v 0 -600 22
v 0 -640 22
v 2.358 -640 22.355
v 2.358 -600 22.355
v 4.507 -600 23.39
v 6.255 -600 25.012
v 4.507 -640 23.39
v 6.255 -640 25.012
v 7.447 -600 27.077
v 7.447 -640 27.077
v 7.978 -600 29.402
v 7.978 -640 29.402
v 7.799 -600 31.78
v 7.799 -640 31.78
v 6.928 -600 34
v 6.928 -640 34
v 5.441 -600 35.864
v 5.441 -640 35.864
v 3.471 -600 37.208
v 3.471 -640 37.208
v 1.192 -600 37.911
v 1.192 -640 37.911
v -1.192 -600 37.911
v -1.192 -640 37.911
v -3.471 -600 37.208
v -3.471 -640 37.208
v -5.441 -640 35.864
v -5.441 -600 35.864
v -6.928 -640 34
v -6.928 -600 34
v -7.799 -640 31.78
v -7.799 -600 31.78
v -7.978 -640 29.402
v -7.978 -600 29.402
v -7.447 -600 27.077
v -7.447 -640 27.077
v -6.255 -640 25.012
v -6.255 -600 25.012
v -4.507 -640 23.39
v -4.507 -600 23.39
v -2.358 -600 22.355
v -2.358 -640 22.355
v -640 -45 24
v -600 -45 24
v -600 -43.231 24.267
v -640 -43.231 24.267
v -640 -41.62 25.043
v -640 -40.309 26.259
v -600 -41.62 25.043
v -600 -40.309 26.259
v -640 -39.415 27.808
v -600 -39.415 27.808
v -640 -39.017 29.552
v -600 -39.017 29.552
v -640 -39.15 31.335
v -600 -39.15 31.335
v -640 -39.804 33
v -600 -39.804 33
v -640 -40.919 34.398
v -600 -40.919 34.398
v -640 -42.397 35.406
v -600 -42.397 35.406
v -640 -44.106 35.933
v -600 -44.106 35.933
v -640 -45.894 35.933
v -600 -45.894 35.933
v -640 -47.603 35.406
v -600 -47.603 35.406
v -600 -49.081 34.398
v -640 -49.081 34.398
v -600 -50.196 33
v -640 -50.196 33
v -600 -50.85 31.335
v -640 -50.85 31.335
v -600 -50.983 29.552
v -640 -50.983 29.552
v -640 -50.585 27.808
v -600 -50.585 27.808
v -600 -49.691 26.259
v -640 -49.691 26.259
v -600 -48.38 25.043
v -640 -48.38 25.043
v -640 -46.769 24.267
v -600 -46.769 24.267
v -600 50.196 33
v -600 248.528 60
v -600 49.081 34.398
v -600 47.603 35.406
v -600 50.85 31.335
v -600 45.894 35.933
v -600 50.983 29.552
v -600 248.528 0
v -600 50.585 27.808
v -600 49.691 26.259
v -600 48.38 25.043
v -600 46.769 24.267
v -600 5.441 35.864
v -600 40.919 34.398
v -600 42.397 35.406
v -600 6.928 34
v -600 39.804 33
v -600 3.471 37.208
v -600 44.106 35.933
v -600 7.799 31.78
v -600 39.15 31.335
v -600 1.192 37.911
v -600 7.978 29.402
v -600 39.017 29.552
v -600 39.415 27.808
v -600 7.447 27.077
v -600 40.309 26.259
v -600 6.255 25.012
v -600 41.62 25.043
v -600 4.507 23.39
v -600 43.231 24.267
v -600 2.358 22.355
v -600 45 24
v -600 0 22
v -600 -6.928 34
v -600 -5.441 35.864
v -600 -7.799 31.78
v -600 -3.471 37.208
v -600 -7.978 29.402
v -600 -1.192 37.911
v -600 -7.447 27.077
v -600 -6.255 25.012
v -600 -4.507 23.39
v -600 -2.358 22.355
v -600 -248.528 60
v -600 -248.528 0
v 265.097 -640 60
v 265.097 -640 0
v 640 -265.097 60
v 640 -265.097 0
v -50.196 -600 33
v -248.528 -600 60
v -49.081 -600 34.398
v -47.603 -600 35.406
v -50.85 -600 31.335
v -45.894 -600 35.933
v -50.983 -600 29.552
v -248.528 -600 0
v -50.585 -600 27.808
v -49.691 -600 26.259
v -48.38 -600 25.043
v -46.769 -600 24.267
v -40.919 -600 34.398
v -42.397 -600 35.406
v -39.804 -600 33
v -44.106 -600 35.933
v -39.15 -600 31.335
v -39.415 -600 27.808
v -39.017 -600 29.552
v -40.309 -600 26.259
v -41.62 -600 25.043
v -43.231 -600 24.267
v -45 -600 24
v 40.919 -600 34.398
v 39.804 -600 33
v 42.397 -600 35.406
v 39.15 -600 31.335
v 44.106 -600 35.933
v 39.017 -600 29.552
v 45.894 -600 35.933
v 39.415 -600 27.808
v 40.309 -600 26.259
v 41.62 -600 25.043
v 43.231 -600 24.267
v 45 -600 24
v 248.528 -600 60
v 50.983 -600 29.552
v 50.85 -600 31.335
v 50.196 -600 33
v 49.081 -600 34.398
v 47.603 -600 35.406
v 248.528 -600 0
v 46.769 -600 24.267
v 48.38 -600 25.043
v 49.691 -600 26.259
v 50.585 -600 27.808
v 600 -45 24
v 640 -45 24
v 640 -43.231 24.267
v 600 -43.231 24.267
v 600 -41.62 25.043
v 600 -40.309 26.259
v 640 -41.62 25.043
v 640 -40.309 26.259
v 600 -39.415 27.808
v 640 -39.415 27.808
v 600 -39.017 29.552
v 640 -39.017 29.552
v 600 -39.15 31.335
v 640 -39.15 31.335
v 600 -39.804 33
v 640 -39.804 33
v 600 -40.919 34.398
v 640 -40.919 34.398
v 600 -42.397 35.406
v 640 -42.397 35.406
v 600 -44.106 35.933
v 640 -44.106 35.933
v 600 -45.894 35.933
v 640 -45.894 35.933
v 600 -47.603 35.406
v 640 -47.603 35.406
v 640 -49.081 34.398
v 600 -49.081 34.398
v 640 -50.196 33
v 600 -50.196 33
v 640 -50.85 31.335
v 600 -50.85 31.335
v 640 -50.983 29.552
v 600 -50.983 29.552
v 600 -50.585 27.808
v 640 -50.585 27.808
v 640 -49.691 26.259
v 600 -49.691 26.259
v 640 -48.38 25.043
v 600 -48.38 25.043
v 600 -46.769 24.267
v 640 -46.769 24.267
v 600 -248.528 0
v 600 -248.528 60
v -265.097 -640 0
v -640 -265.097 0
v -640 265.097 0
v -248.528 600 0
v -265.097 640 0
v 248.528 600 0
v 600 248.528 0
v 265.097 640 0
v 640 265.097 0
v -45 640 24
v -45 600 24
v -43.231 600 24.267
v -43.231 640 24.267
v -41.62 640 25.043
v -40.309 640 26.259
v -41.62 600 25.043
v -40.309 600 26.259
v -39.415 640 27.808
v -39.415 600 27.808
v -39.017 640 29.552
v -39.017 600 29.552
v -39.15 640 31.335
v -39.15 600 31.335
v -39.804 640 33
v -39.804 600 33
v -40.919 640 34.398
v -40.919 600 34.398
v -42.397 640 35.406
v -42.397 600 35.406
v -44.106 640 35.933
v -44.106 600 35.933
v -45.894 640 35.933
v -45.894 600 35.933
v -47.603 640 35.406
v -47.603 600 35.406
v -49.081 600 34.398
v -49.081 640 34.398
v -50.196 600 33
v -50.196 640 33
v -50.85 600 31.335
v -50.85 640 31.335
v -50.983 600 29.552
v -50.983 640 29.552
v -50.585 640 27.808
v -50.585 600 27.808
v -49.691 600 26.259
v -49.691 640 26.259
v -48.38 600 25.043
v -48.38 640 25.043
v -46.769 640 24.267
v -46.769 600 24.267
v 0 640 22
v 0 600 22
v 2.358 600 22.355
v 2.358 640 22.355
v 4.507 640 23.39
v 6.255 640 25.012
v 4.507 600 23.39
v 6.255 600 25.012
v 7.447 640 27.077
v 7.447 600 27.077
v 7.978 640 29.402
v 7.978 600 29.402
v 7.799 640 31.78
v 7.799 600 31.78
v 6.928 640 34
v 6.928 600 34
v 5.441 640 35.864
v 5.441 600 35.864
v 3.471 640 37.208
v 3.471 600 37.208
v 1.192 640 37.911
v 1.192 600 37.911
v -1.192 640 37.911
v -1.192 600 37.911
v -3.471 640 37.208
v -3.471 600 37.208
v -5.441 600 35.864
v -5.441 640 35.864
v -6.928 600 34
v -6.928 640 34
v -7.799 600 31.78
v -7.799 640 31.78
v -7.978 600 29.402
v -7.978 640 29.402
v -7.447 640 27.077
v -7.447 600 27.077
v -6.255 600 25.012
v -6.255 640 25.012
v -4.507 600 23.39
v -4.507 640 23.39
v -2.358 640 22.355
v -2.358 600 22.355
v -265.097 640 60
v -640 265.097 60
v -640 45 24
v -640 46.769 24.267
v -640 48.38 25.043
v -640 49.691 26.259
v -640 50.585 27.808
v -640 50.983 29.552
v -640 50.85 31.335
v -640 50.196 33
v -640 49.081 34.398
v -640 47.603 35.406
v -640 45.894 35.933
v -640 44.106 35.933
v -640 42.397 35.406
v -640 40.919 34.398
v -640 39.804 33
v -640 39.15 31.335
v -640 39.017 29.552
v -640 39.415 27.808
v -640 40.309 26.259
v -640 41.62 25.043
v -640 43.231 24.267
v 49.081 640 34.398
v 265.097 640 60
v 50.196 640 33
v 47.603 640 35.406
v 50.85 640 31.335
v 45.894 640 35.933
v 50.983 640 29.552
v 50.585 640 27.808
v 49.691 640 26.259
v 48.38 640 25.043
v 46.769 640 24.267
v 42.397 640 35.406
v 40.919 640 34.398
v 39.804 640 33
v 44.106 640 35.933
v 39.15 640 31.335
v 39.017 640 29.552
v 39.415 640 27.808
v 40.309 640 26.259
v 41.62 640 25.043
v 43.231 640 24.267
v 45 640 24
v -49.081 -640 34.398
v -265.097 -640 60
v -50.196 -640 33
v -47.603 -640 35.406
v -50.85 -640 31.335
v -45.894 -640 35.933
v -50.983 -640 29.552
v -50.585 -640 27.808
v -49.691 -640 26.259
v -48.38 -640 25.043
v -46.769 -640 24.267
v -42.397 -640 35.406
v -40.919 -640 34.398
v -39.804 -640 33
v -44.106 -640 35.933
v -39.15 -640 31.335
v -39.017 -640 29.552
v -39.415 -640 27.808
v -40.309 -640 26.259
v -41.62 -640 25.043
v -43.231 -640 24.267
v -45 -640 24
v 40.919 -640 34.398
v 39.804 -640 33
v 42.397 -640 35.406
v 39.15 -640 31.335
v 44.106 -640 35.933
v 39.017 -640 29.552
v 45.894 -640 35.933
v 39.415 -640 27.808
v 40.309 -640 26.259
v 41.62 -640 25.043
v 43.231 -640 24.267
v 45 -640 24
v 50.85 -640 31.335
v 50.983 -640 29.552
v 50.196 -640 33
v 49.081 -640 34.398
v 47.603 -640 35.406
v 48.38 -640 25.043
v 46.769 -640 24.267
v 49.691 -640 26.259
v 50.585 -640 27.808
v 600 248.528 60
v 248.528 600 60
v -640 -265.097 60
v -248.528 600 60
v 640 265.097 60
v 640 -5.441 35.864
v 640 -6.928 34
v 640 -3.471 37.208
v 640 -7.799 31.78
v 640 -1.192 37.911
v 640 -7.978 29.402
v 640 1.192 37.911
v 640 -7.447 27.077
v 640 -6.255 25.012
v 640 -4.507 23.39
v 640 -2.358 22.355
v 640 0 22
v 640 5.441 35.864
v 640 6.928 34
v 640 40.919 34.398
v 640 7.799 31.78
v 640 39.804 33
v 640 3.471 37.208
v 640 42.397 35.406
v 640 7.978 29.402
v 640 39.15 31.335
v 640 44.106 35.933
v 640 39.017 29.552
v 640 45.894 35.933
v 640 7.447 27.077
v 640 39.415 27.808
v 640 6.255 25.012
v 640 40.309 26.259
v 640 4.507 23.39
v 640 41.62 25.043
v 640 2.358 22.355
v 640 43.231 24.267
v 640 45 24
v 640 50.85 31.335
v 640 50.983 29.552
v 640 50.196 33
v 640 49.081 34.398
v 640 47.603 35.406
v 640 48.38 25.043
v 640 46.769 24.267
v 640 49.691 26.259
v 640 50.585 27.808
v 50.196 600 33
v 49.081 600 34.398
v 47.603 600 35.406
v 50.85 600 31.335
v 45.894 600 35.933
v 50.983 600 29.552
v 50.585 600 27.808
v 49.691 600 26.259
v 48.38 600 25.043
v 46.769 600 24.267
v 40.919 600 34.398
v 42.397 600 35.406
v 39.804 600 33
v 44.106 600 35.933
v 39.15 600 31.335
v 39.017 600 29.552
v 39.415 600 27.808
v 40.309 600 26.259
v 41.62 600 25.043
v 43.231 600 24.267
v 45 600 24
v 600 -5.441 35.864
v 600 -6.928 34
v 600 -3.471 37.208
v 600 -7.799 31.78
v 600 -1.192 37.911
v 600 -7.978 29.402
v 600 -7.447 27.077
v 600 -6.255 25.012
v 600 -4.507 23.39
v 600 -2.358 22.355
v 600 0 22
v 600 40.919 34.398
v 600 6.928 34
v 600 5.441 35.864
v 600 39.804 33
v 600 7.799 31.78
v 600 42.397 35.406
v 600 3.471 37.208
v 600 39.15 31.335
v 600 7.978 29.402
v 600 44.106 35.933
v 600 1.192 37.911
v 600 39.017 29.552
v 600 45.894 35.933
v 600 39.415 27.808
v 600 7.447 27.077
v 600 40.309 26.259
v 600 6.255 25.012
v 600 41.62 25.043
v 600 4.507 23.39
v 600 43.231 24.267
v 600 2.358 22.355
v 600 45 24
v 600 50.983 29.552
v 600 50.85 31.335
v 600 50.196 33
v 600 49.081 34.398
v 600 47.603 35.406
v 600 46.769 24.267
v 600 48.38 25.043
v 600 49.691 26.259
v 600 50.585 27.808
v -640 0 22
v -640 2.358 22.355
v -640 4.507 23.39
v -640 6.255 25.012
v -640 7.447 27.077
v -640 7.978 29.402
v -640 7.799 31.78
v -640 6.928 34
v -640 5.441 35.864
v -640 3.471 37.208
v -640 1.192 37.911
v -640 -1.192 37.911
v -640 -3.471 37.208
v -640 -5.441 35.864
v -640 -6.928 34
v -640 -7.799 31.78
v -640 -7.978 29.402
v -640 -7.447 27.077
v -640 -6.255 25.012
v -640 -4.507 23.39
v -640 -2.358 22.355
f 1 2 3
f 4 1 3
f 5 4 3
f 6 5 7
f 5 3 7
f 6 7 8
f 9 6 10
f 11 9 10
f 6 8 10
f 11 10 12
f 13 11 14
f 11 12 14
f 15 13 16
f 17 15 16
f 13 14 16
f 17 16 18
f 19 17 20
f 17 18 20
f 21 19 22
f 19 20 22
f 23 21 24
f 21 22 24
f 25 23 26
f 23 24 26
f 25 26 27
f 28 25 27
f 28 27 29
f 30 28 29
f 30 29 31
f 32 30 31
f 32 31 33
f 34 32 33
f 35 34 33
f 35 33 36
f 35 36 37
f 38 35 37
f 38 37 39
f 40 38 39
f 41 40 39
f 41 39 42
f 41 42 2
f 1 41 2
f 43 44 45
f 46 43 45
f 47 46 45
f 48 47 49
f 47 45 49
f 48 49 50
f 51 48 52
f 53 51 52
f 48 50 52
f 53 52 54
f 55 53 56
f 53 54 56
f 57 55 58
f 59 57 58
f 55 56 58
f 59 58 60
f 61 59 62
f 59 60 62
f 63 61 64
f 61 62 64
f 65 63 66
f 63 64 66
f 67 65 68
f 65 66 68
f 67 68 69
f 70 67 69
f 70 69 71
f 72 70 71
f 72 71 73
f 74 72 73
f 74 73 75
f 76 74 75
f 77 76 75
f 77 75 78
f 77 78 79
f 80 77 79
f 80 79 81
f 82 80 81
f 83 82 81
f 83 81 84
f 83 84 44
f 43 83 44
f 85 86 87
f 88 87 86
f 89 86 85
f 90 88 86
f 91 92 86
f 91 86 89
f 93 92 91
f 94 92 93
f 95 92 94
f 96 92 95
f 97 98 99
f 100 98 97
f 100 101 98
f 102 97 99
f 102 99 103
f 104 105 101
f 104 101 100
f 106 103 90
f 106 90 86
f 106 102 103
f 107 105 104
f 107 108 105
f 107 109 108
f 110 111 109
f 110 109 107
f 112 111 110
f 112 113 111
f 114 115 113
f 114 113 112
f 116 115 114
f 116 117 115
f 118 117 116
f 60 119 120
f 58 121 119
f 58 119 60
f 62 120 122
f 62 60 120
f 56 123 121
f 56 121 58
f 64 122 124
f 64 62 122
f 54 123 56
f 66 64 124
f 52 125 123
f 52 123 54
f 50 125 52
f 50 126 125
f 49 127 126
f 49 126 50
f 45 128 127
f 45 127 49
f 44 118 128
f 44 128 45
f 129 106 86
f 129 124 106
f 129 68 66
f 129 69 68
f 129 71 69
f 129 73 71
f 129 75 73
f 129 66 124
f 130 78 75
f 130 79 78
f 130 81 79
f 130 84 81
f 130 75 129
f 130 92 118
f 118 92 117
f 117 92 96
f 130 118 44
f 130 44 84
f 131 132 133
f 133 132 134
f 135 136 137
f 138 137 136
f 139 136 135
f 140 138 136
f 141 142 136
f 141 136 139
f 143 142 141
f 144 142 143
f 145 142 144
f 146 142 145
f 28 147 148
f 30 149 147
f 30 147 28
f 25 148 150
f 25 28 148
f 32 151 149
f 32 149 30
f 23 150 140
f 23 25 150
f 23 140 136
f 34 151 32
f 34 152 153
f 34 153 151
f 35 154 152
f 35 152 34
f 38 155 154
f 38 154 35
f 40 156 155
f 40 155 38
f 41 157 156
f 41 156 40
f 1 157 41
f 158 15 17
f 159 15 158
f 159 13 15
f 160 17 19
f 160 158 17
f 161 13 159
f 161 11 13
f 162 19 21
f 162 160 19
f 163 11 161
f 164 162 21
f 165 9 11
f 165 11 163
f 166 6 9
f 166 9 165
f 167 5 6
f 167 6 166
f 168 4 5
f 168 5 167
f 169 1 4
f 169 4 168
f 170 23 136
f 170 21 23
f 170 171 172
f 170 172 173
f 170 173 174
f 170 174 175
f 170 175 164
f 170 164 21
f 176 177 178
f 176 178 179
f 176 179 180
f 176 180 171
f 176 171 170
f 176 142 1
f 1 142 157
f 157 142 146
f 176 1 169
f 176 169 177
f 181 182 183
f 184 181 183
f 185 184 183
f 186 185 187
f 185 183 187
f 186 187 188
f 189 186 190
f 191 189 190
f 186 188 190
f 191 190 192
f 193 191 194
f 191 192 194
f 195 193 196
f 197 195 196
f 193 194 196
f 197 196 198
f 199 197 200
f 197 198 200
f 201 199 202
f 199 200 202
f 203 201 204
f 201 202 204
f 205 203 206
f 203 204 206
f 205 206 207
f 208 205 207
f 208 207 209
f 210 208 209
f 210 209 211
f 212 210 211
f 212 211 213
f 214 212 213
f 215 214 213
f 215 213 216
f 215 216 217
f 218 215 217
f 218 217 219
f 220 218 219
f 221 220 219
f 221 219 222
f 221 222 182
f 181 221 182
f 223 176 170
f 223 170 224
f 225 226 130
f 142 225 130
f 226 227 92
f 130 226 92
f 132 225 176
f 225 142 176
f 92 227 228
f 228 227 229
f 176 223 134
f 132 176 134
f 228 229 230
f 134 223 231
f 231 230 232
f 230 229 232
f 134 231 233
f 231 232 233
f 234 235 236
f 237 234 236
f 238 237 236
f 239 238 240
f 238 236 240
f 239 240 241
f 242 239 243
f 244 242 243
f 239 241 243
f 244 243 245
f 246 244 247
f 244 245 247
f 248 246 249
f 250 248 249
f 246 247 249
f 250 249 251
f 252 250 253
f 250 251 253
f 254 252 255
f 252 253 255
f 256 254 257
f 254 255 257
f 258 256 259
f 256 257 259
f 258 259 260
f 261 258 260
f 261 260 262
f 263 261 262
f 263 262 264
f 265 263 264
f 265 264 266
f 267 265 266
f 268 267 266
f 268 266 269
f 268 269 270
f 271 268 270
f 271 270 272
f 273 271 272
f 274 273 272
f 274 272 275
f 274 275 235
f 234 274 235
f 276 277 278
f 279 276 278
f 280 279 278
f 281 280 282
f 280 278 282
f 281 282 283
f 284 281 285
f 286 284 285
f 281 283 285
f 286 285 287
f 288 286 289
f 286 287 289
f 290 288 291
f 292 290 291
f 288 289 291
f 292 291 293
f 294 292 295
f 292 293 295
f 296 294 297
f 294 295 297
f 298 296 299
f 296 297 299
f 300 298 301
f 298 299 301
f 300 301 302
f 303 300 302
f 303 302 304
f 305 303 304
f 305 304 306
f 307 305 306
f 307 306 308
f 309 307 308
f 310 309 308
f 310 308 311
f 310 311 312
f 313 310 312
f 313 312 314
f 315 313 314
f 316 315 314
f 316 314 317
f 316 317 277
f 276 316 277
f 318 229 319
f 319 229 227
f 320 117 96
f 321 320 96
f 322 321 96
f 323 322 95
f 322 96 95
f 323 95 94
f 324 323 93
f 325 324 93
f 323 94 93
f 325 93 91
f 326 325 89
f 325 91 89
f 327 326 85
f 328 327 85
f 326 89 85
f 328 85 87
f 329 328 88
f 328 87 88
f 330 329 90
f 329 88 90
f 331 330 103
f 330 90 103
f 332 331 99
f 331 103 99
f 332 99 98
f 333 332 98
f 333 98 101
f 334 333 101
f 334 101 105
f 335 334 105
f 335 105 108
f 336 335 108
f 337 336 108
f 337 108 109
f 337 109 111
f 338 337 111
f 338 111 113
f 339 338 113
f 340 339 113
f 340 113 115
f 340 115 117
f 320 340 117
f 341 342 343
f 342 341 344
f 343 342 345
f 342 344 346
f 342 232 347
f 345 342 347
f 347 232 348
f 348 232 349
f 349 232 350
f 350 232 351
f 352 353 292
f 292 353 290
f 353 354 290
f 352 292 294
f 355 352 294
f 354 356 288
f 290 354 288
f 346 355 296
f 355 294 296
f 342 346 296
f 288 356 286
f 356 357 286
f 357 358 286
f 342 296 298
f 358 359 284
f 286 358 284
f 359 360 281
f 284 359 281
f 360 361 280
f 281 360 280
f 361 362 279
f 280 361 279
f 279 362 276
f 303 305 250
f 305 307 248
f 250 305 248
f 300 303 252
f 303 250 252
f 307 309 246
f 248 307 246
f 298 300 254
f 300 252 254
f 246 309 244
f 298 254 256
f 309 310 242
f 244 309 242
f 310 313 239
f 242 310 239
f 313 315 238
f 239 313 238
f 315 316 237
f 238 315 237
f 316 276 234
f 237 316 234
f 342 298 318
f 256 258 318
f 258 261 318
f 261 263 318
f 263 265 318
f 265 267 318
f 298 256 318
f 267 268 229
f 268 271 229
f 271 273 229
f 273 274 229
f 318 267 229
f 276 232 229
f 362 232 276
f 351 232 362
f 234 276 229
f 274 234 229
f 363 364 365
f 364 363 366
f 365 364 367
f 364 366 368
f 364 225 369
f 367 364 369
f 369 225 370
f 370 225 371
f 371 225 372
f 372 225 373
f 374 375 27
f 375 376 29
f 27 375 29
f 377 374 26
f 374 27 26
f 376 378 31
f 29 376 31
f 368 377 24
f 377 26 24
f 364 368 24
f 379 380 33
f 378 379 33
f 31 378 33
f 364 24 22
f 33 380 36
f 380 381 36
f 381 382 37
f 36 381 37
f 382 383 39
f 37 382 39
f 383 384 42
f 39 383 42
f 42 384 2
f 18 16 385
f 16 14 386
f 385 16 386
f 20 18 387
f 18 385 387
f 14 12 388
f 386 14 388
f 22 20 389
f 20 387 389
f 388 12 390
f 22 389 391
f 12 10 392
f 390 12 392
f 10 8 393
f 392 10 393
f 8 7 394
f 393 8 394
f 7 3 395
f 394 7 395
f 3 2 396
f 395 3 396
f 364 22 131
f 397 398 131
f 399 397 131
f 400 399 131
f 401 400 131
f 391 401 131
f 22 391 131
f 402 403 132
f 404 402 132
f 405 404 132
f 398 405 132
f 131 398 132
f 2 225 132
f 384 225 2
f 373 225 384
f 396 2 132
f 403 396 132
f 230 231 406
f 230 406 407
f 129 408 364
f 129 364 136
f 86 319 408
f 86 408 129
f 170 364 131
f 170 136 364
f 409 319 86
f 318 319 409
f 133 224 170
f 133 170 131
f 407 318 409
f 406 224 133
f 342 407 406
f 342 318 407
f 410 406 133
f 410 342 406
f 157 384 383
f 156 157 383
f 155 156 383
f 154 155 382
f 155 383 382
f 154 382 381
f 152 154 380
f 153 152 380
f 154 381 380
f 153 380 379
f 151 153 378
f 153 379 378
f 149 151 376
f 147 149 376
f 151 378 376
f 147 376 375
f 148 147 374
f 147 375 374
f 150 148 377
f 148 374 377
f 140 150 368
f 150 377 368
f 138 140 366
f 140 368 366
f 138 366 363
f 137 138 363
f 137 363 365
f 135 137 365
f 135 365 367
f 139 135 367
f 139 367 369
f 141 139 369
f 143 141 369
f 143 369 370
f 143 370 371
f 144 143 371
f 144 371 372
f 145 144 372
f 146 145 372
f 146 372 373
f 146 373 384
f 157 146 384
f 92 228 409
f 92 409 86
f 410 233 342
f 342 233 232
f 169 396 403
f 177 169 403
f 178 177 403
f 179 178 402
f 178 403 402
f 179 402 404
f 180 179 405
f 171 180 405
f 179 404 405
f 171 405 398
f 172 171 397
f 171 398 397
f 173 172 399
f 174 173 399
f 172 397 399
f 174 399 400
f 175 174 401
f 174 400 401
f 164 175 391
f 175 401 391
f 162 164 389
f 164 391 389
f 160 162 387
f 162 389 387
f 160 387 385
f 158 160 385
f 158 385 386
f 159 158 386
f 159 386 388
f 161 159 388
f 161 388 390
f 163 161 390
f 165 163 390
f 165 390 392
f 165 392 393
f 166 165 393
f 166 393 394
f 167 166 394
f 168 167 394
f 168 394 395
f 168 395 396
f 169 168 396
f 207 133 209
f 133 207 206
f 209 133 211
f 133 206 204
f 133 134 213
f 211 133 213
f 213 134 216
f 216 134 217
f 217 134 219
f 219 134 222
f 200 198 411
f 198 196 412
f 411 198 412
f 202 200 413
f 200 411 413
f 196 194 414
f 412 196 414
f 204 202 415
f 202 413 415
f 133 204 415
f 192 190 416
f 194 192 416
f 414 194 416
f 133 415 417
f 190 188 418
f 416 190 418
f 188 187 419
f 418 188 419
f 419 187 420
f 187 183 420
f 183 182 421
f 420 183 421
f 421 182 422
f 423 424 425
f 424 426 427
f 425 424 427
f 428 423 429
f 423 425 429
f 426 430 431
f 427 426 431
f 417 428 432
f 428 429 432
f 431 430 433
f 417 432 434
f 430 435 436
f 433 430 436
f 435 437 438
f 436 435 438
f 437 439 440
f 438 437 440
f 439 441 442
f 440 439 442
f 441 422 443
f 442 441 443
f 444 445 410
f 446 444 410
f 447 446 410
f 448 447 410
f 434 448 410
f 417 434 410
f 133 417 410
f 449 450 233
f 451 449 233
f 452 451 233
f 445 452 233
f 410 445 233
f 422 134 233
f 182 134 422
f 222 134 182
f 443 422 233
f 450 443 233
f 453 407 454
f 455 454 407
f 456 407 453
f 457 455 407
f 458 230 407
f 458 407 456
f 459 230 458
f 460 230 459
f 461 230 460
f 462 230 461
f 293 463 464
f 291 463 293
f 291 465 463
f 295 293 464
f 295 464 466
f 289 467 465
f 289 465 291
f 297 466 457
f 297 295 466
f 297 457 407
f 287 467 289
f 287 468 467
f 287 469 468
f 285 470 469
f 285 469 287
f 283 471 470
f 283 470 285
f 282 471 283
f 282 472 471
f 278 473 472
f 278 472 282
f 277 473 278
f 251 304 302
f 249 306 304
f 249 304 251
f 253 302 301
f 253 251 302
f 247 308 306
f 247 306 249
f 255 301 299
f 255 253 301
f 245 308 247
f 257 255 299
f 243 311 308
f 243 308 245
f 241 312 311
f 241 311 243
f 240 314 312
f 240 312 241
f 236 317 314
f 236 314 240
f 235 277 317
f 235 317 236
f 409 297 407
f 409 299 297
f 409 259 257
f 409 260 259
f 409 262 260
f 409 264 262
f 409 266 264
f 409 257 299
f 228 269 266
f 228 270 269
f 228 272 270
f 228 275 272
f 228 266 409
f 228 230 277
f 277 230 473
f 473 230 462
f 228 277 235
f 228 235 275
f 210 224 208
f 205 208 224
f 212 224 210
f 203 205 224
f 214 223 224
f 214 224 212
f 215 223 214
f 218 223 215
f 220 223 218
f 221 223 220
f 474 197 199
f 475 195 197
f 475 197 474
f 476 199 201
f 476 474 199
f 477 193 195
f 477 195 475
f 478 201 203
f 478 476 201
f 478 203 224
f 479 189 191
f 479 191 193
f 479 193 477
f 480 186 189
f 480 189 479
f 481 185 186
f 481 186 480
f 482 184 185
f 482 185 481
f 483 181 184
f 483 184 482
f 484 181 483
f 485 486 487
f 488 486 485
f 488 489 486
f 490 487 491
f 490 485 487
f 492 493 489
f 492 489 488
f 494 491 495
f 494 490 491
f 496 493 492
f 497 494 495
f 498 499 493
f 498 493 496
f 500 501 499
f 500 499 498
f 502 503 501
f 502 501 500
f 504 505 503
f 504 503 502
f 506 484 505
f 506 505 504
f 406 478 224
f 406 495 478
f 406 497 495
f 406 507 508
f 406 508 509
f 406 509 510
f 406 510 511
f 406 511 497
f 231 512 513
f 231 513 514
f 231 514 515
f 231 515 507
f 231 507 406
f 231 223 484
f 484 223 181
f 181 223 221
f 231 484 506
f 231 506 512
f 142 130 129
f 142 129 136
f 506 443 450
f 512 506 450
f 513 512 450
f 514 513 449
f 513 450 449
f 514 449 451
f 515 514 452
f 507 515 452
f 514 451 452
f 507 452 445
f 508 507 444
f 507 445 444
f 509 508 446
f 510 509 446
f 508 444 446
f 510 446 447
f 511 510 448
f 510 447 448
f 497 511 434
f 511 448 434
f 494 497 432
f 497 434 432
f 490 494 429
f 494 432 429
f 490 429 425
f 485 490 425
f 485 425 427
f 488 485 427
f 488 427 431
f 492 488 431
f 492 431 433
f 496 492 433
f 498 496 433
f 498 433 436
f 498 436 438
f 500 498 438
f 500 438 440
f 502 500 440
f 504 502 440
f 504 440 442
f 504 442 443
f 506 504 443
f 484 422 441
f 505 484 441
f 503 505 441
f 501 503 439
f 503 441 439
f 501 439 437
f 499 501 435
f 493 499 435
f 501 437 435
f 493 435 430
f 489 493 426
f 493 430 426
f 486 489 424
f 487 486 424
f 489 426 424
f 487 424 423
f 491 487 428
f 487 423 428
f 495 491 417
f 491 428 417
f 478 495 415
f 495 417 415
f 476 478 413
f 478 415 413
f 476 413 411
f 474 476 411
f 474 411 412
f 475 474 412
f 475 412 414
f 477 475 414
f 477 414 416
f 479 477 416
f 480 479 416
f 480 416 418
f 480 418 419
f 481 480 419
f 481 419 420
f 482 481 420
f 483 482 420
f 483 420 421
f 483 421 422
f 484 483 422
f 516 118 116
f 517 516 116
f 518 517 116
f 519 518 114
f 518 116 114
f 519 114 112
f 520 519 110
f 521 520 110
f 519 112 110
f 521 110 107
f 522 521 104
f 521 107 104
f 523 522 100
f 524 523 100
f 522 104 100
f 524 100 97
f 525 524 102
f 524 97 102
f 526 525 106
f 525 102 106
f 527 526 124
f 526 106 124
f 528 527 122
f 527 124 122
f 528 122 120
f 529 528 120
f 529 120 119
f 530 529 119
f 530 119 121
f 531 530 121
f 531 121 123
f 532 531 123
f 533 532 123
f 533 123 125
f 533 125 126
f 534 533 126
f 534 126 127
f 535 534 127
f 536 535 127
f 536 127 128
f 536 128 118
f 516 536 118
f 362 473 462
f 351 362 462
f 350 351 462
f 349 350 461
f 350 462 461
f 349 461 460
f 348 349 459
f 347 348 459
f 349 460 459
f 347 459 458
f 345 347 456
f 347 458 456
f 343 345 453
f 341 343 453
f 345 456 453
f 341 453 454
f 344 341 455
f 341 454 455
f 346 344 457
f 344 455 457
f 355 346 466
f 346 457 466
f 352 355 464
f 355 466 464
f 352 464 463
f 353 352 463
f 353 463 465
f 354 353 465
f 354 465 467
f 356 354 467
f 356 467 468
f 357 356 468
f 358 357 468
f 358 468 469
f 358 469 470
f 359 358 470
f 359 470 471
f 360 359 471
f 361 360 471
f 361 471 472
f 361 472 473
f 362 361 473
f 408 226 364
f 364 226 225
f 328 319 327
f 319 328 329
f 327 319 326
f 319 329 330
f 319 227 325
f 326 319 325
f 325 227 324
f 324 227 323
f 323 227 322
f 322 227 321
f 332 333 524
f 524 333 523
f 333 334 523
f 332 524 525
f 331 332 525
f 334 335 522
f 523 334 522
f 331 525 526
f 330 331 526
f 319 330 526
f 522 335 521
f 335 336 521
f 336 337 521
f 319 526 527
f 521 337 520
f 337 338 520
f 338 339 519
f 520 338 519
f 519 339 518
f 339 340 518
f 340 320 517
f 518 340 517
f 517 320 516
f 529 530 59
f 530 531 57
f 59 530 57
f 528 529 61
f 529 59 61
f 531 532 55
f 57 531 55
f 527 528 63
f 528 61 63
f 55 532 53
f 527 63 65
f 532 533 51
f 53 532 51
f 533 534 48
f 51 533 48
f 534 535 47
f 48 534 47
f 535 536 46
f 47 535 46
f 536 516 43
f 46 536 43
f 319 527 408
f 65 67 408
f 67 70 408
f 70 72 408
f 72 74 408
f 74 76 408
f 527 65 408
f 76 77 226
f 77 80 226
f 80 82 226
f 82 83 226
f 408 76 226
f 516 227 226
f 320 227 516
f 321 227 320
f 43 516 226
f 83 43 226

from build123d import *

# Parameters (mm, degrees)
BOSS_EXTRUDE1_DEPTH = 60
SKETCH2_R           = 8
SKETCH2_R_2         = 6
CUT_EXTRUDE1_DEPTH  = 1899
SKETCH3_R           = 8
SKETCH3_R_2         = 6
CUT_EXTRUDE2_DEPTH  = 1899


with BuildPart() as part:
    # Sketch1 → Boss-Extrude1 (new body)
    with BuildSketch(Plane.XY):
        Polygon((265.096679919, 640), (-265.096679919, 640), (-640, 265.096679919), (-640, -265.096679919), (-265.096679919, -640), (265.096679919, -640), (640, -265.096679919), (640, 265.096679919), align=None)
        Polygon((600, -248.528137424), (600, 248.528137424), (248.528137424, 600), (-248.528137424, 600), (-600, 248.528137424), (-600, -248.528137424), (-248.528137424, -600), (248.528137424, -600), align=None, mode=Mode.SUBTRACT)
    extrude(amount=BOSS_EXTRUDE1_DEPTH)

    # Sketch2 → Cut-Extrude1 (cut)
    with BuildSketch(Plane(origin=(640, 0, 0), x_dir=(0, 0, -1), z_dir=(1, 0, 0))):
        with Locations((-30, 0)):
            Circle(SKETCH2_R)
        with Locations((-30, 45)):
            Circle(SKETCH2_R_2)
        with Locations((-30, -45)):
            Circle(SKETCH2_R_2)
    extrude(amount=-CUT_EXTRUDE1_DEPTH, mode=Mode.SUBTRACT)

    # Sketch3 → Cut-Extrude2 (cut)
    with BuildSketch(Plane.XZ.offset(640)):
        with Locations(Location((0, 30, 0), (0, 0, 270))):
            Circle(SKETCH3_R)
        with Locations(Location((-45, 30, 0), (0, 0, 270))):
            Circle(SKETCH3_R_2)
        with Locations(Location((45, 30, 0), (0, 0, 270))):
            Circle(SKETCH3_R_2)
    extrude(amount=-CUT_EXTRUDE2_DEPTH, mode=Mode.SUBTRACT)


solid = part.part
